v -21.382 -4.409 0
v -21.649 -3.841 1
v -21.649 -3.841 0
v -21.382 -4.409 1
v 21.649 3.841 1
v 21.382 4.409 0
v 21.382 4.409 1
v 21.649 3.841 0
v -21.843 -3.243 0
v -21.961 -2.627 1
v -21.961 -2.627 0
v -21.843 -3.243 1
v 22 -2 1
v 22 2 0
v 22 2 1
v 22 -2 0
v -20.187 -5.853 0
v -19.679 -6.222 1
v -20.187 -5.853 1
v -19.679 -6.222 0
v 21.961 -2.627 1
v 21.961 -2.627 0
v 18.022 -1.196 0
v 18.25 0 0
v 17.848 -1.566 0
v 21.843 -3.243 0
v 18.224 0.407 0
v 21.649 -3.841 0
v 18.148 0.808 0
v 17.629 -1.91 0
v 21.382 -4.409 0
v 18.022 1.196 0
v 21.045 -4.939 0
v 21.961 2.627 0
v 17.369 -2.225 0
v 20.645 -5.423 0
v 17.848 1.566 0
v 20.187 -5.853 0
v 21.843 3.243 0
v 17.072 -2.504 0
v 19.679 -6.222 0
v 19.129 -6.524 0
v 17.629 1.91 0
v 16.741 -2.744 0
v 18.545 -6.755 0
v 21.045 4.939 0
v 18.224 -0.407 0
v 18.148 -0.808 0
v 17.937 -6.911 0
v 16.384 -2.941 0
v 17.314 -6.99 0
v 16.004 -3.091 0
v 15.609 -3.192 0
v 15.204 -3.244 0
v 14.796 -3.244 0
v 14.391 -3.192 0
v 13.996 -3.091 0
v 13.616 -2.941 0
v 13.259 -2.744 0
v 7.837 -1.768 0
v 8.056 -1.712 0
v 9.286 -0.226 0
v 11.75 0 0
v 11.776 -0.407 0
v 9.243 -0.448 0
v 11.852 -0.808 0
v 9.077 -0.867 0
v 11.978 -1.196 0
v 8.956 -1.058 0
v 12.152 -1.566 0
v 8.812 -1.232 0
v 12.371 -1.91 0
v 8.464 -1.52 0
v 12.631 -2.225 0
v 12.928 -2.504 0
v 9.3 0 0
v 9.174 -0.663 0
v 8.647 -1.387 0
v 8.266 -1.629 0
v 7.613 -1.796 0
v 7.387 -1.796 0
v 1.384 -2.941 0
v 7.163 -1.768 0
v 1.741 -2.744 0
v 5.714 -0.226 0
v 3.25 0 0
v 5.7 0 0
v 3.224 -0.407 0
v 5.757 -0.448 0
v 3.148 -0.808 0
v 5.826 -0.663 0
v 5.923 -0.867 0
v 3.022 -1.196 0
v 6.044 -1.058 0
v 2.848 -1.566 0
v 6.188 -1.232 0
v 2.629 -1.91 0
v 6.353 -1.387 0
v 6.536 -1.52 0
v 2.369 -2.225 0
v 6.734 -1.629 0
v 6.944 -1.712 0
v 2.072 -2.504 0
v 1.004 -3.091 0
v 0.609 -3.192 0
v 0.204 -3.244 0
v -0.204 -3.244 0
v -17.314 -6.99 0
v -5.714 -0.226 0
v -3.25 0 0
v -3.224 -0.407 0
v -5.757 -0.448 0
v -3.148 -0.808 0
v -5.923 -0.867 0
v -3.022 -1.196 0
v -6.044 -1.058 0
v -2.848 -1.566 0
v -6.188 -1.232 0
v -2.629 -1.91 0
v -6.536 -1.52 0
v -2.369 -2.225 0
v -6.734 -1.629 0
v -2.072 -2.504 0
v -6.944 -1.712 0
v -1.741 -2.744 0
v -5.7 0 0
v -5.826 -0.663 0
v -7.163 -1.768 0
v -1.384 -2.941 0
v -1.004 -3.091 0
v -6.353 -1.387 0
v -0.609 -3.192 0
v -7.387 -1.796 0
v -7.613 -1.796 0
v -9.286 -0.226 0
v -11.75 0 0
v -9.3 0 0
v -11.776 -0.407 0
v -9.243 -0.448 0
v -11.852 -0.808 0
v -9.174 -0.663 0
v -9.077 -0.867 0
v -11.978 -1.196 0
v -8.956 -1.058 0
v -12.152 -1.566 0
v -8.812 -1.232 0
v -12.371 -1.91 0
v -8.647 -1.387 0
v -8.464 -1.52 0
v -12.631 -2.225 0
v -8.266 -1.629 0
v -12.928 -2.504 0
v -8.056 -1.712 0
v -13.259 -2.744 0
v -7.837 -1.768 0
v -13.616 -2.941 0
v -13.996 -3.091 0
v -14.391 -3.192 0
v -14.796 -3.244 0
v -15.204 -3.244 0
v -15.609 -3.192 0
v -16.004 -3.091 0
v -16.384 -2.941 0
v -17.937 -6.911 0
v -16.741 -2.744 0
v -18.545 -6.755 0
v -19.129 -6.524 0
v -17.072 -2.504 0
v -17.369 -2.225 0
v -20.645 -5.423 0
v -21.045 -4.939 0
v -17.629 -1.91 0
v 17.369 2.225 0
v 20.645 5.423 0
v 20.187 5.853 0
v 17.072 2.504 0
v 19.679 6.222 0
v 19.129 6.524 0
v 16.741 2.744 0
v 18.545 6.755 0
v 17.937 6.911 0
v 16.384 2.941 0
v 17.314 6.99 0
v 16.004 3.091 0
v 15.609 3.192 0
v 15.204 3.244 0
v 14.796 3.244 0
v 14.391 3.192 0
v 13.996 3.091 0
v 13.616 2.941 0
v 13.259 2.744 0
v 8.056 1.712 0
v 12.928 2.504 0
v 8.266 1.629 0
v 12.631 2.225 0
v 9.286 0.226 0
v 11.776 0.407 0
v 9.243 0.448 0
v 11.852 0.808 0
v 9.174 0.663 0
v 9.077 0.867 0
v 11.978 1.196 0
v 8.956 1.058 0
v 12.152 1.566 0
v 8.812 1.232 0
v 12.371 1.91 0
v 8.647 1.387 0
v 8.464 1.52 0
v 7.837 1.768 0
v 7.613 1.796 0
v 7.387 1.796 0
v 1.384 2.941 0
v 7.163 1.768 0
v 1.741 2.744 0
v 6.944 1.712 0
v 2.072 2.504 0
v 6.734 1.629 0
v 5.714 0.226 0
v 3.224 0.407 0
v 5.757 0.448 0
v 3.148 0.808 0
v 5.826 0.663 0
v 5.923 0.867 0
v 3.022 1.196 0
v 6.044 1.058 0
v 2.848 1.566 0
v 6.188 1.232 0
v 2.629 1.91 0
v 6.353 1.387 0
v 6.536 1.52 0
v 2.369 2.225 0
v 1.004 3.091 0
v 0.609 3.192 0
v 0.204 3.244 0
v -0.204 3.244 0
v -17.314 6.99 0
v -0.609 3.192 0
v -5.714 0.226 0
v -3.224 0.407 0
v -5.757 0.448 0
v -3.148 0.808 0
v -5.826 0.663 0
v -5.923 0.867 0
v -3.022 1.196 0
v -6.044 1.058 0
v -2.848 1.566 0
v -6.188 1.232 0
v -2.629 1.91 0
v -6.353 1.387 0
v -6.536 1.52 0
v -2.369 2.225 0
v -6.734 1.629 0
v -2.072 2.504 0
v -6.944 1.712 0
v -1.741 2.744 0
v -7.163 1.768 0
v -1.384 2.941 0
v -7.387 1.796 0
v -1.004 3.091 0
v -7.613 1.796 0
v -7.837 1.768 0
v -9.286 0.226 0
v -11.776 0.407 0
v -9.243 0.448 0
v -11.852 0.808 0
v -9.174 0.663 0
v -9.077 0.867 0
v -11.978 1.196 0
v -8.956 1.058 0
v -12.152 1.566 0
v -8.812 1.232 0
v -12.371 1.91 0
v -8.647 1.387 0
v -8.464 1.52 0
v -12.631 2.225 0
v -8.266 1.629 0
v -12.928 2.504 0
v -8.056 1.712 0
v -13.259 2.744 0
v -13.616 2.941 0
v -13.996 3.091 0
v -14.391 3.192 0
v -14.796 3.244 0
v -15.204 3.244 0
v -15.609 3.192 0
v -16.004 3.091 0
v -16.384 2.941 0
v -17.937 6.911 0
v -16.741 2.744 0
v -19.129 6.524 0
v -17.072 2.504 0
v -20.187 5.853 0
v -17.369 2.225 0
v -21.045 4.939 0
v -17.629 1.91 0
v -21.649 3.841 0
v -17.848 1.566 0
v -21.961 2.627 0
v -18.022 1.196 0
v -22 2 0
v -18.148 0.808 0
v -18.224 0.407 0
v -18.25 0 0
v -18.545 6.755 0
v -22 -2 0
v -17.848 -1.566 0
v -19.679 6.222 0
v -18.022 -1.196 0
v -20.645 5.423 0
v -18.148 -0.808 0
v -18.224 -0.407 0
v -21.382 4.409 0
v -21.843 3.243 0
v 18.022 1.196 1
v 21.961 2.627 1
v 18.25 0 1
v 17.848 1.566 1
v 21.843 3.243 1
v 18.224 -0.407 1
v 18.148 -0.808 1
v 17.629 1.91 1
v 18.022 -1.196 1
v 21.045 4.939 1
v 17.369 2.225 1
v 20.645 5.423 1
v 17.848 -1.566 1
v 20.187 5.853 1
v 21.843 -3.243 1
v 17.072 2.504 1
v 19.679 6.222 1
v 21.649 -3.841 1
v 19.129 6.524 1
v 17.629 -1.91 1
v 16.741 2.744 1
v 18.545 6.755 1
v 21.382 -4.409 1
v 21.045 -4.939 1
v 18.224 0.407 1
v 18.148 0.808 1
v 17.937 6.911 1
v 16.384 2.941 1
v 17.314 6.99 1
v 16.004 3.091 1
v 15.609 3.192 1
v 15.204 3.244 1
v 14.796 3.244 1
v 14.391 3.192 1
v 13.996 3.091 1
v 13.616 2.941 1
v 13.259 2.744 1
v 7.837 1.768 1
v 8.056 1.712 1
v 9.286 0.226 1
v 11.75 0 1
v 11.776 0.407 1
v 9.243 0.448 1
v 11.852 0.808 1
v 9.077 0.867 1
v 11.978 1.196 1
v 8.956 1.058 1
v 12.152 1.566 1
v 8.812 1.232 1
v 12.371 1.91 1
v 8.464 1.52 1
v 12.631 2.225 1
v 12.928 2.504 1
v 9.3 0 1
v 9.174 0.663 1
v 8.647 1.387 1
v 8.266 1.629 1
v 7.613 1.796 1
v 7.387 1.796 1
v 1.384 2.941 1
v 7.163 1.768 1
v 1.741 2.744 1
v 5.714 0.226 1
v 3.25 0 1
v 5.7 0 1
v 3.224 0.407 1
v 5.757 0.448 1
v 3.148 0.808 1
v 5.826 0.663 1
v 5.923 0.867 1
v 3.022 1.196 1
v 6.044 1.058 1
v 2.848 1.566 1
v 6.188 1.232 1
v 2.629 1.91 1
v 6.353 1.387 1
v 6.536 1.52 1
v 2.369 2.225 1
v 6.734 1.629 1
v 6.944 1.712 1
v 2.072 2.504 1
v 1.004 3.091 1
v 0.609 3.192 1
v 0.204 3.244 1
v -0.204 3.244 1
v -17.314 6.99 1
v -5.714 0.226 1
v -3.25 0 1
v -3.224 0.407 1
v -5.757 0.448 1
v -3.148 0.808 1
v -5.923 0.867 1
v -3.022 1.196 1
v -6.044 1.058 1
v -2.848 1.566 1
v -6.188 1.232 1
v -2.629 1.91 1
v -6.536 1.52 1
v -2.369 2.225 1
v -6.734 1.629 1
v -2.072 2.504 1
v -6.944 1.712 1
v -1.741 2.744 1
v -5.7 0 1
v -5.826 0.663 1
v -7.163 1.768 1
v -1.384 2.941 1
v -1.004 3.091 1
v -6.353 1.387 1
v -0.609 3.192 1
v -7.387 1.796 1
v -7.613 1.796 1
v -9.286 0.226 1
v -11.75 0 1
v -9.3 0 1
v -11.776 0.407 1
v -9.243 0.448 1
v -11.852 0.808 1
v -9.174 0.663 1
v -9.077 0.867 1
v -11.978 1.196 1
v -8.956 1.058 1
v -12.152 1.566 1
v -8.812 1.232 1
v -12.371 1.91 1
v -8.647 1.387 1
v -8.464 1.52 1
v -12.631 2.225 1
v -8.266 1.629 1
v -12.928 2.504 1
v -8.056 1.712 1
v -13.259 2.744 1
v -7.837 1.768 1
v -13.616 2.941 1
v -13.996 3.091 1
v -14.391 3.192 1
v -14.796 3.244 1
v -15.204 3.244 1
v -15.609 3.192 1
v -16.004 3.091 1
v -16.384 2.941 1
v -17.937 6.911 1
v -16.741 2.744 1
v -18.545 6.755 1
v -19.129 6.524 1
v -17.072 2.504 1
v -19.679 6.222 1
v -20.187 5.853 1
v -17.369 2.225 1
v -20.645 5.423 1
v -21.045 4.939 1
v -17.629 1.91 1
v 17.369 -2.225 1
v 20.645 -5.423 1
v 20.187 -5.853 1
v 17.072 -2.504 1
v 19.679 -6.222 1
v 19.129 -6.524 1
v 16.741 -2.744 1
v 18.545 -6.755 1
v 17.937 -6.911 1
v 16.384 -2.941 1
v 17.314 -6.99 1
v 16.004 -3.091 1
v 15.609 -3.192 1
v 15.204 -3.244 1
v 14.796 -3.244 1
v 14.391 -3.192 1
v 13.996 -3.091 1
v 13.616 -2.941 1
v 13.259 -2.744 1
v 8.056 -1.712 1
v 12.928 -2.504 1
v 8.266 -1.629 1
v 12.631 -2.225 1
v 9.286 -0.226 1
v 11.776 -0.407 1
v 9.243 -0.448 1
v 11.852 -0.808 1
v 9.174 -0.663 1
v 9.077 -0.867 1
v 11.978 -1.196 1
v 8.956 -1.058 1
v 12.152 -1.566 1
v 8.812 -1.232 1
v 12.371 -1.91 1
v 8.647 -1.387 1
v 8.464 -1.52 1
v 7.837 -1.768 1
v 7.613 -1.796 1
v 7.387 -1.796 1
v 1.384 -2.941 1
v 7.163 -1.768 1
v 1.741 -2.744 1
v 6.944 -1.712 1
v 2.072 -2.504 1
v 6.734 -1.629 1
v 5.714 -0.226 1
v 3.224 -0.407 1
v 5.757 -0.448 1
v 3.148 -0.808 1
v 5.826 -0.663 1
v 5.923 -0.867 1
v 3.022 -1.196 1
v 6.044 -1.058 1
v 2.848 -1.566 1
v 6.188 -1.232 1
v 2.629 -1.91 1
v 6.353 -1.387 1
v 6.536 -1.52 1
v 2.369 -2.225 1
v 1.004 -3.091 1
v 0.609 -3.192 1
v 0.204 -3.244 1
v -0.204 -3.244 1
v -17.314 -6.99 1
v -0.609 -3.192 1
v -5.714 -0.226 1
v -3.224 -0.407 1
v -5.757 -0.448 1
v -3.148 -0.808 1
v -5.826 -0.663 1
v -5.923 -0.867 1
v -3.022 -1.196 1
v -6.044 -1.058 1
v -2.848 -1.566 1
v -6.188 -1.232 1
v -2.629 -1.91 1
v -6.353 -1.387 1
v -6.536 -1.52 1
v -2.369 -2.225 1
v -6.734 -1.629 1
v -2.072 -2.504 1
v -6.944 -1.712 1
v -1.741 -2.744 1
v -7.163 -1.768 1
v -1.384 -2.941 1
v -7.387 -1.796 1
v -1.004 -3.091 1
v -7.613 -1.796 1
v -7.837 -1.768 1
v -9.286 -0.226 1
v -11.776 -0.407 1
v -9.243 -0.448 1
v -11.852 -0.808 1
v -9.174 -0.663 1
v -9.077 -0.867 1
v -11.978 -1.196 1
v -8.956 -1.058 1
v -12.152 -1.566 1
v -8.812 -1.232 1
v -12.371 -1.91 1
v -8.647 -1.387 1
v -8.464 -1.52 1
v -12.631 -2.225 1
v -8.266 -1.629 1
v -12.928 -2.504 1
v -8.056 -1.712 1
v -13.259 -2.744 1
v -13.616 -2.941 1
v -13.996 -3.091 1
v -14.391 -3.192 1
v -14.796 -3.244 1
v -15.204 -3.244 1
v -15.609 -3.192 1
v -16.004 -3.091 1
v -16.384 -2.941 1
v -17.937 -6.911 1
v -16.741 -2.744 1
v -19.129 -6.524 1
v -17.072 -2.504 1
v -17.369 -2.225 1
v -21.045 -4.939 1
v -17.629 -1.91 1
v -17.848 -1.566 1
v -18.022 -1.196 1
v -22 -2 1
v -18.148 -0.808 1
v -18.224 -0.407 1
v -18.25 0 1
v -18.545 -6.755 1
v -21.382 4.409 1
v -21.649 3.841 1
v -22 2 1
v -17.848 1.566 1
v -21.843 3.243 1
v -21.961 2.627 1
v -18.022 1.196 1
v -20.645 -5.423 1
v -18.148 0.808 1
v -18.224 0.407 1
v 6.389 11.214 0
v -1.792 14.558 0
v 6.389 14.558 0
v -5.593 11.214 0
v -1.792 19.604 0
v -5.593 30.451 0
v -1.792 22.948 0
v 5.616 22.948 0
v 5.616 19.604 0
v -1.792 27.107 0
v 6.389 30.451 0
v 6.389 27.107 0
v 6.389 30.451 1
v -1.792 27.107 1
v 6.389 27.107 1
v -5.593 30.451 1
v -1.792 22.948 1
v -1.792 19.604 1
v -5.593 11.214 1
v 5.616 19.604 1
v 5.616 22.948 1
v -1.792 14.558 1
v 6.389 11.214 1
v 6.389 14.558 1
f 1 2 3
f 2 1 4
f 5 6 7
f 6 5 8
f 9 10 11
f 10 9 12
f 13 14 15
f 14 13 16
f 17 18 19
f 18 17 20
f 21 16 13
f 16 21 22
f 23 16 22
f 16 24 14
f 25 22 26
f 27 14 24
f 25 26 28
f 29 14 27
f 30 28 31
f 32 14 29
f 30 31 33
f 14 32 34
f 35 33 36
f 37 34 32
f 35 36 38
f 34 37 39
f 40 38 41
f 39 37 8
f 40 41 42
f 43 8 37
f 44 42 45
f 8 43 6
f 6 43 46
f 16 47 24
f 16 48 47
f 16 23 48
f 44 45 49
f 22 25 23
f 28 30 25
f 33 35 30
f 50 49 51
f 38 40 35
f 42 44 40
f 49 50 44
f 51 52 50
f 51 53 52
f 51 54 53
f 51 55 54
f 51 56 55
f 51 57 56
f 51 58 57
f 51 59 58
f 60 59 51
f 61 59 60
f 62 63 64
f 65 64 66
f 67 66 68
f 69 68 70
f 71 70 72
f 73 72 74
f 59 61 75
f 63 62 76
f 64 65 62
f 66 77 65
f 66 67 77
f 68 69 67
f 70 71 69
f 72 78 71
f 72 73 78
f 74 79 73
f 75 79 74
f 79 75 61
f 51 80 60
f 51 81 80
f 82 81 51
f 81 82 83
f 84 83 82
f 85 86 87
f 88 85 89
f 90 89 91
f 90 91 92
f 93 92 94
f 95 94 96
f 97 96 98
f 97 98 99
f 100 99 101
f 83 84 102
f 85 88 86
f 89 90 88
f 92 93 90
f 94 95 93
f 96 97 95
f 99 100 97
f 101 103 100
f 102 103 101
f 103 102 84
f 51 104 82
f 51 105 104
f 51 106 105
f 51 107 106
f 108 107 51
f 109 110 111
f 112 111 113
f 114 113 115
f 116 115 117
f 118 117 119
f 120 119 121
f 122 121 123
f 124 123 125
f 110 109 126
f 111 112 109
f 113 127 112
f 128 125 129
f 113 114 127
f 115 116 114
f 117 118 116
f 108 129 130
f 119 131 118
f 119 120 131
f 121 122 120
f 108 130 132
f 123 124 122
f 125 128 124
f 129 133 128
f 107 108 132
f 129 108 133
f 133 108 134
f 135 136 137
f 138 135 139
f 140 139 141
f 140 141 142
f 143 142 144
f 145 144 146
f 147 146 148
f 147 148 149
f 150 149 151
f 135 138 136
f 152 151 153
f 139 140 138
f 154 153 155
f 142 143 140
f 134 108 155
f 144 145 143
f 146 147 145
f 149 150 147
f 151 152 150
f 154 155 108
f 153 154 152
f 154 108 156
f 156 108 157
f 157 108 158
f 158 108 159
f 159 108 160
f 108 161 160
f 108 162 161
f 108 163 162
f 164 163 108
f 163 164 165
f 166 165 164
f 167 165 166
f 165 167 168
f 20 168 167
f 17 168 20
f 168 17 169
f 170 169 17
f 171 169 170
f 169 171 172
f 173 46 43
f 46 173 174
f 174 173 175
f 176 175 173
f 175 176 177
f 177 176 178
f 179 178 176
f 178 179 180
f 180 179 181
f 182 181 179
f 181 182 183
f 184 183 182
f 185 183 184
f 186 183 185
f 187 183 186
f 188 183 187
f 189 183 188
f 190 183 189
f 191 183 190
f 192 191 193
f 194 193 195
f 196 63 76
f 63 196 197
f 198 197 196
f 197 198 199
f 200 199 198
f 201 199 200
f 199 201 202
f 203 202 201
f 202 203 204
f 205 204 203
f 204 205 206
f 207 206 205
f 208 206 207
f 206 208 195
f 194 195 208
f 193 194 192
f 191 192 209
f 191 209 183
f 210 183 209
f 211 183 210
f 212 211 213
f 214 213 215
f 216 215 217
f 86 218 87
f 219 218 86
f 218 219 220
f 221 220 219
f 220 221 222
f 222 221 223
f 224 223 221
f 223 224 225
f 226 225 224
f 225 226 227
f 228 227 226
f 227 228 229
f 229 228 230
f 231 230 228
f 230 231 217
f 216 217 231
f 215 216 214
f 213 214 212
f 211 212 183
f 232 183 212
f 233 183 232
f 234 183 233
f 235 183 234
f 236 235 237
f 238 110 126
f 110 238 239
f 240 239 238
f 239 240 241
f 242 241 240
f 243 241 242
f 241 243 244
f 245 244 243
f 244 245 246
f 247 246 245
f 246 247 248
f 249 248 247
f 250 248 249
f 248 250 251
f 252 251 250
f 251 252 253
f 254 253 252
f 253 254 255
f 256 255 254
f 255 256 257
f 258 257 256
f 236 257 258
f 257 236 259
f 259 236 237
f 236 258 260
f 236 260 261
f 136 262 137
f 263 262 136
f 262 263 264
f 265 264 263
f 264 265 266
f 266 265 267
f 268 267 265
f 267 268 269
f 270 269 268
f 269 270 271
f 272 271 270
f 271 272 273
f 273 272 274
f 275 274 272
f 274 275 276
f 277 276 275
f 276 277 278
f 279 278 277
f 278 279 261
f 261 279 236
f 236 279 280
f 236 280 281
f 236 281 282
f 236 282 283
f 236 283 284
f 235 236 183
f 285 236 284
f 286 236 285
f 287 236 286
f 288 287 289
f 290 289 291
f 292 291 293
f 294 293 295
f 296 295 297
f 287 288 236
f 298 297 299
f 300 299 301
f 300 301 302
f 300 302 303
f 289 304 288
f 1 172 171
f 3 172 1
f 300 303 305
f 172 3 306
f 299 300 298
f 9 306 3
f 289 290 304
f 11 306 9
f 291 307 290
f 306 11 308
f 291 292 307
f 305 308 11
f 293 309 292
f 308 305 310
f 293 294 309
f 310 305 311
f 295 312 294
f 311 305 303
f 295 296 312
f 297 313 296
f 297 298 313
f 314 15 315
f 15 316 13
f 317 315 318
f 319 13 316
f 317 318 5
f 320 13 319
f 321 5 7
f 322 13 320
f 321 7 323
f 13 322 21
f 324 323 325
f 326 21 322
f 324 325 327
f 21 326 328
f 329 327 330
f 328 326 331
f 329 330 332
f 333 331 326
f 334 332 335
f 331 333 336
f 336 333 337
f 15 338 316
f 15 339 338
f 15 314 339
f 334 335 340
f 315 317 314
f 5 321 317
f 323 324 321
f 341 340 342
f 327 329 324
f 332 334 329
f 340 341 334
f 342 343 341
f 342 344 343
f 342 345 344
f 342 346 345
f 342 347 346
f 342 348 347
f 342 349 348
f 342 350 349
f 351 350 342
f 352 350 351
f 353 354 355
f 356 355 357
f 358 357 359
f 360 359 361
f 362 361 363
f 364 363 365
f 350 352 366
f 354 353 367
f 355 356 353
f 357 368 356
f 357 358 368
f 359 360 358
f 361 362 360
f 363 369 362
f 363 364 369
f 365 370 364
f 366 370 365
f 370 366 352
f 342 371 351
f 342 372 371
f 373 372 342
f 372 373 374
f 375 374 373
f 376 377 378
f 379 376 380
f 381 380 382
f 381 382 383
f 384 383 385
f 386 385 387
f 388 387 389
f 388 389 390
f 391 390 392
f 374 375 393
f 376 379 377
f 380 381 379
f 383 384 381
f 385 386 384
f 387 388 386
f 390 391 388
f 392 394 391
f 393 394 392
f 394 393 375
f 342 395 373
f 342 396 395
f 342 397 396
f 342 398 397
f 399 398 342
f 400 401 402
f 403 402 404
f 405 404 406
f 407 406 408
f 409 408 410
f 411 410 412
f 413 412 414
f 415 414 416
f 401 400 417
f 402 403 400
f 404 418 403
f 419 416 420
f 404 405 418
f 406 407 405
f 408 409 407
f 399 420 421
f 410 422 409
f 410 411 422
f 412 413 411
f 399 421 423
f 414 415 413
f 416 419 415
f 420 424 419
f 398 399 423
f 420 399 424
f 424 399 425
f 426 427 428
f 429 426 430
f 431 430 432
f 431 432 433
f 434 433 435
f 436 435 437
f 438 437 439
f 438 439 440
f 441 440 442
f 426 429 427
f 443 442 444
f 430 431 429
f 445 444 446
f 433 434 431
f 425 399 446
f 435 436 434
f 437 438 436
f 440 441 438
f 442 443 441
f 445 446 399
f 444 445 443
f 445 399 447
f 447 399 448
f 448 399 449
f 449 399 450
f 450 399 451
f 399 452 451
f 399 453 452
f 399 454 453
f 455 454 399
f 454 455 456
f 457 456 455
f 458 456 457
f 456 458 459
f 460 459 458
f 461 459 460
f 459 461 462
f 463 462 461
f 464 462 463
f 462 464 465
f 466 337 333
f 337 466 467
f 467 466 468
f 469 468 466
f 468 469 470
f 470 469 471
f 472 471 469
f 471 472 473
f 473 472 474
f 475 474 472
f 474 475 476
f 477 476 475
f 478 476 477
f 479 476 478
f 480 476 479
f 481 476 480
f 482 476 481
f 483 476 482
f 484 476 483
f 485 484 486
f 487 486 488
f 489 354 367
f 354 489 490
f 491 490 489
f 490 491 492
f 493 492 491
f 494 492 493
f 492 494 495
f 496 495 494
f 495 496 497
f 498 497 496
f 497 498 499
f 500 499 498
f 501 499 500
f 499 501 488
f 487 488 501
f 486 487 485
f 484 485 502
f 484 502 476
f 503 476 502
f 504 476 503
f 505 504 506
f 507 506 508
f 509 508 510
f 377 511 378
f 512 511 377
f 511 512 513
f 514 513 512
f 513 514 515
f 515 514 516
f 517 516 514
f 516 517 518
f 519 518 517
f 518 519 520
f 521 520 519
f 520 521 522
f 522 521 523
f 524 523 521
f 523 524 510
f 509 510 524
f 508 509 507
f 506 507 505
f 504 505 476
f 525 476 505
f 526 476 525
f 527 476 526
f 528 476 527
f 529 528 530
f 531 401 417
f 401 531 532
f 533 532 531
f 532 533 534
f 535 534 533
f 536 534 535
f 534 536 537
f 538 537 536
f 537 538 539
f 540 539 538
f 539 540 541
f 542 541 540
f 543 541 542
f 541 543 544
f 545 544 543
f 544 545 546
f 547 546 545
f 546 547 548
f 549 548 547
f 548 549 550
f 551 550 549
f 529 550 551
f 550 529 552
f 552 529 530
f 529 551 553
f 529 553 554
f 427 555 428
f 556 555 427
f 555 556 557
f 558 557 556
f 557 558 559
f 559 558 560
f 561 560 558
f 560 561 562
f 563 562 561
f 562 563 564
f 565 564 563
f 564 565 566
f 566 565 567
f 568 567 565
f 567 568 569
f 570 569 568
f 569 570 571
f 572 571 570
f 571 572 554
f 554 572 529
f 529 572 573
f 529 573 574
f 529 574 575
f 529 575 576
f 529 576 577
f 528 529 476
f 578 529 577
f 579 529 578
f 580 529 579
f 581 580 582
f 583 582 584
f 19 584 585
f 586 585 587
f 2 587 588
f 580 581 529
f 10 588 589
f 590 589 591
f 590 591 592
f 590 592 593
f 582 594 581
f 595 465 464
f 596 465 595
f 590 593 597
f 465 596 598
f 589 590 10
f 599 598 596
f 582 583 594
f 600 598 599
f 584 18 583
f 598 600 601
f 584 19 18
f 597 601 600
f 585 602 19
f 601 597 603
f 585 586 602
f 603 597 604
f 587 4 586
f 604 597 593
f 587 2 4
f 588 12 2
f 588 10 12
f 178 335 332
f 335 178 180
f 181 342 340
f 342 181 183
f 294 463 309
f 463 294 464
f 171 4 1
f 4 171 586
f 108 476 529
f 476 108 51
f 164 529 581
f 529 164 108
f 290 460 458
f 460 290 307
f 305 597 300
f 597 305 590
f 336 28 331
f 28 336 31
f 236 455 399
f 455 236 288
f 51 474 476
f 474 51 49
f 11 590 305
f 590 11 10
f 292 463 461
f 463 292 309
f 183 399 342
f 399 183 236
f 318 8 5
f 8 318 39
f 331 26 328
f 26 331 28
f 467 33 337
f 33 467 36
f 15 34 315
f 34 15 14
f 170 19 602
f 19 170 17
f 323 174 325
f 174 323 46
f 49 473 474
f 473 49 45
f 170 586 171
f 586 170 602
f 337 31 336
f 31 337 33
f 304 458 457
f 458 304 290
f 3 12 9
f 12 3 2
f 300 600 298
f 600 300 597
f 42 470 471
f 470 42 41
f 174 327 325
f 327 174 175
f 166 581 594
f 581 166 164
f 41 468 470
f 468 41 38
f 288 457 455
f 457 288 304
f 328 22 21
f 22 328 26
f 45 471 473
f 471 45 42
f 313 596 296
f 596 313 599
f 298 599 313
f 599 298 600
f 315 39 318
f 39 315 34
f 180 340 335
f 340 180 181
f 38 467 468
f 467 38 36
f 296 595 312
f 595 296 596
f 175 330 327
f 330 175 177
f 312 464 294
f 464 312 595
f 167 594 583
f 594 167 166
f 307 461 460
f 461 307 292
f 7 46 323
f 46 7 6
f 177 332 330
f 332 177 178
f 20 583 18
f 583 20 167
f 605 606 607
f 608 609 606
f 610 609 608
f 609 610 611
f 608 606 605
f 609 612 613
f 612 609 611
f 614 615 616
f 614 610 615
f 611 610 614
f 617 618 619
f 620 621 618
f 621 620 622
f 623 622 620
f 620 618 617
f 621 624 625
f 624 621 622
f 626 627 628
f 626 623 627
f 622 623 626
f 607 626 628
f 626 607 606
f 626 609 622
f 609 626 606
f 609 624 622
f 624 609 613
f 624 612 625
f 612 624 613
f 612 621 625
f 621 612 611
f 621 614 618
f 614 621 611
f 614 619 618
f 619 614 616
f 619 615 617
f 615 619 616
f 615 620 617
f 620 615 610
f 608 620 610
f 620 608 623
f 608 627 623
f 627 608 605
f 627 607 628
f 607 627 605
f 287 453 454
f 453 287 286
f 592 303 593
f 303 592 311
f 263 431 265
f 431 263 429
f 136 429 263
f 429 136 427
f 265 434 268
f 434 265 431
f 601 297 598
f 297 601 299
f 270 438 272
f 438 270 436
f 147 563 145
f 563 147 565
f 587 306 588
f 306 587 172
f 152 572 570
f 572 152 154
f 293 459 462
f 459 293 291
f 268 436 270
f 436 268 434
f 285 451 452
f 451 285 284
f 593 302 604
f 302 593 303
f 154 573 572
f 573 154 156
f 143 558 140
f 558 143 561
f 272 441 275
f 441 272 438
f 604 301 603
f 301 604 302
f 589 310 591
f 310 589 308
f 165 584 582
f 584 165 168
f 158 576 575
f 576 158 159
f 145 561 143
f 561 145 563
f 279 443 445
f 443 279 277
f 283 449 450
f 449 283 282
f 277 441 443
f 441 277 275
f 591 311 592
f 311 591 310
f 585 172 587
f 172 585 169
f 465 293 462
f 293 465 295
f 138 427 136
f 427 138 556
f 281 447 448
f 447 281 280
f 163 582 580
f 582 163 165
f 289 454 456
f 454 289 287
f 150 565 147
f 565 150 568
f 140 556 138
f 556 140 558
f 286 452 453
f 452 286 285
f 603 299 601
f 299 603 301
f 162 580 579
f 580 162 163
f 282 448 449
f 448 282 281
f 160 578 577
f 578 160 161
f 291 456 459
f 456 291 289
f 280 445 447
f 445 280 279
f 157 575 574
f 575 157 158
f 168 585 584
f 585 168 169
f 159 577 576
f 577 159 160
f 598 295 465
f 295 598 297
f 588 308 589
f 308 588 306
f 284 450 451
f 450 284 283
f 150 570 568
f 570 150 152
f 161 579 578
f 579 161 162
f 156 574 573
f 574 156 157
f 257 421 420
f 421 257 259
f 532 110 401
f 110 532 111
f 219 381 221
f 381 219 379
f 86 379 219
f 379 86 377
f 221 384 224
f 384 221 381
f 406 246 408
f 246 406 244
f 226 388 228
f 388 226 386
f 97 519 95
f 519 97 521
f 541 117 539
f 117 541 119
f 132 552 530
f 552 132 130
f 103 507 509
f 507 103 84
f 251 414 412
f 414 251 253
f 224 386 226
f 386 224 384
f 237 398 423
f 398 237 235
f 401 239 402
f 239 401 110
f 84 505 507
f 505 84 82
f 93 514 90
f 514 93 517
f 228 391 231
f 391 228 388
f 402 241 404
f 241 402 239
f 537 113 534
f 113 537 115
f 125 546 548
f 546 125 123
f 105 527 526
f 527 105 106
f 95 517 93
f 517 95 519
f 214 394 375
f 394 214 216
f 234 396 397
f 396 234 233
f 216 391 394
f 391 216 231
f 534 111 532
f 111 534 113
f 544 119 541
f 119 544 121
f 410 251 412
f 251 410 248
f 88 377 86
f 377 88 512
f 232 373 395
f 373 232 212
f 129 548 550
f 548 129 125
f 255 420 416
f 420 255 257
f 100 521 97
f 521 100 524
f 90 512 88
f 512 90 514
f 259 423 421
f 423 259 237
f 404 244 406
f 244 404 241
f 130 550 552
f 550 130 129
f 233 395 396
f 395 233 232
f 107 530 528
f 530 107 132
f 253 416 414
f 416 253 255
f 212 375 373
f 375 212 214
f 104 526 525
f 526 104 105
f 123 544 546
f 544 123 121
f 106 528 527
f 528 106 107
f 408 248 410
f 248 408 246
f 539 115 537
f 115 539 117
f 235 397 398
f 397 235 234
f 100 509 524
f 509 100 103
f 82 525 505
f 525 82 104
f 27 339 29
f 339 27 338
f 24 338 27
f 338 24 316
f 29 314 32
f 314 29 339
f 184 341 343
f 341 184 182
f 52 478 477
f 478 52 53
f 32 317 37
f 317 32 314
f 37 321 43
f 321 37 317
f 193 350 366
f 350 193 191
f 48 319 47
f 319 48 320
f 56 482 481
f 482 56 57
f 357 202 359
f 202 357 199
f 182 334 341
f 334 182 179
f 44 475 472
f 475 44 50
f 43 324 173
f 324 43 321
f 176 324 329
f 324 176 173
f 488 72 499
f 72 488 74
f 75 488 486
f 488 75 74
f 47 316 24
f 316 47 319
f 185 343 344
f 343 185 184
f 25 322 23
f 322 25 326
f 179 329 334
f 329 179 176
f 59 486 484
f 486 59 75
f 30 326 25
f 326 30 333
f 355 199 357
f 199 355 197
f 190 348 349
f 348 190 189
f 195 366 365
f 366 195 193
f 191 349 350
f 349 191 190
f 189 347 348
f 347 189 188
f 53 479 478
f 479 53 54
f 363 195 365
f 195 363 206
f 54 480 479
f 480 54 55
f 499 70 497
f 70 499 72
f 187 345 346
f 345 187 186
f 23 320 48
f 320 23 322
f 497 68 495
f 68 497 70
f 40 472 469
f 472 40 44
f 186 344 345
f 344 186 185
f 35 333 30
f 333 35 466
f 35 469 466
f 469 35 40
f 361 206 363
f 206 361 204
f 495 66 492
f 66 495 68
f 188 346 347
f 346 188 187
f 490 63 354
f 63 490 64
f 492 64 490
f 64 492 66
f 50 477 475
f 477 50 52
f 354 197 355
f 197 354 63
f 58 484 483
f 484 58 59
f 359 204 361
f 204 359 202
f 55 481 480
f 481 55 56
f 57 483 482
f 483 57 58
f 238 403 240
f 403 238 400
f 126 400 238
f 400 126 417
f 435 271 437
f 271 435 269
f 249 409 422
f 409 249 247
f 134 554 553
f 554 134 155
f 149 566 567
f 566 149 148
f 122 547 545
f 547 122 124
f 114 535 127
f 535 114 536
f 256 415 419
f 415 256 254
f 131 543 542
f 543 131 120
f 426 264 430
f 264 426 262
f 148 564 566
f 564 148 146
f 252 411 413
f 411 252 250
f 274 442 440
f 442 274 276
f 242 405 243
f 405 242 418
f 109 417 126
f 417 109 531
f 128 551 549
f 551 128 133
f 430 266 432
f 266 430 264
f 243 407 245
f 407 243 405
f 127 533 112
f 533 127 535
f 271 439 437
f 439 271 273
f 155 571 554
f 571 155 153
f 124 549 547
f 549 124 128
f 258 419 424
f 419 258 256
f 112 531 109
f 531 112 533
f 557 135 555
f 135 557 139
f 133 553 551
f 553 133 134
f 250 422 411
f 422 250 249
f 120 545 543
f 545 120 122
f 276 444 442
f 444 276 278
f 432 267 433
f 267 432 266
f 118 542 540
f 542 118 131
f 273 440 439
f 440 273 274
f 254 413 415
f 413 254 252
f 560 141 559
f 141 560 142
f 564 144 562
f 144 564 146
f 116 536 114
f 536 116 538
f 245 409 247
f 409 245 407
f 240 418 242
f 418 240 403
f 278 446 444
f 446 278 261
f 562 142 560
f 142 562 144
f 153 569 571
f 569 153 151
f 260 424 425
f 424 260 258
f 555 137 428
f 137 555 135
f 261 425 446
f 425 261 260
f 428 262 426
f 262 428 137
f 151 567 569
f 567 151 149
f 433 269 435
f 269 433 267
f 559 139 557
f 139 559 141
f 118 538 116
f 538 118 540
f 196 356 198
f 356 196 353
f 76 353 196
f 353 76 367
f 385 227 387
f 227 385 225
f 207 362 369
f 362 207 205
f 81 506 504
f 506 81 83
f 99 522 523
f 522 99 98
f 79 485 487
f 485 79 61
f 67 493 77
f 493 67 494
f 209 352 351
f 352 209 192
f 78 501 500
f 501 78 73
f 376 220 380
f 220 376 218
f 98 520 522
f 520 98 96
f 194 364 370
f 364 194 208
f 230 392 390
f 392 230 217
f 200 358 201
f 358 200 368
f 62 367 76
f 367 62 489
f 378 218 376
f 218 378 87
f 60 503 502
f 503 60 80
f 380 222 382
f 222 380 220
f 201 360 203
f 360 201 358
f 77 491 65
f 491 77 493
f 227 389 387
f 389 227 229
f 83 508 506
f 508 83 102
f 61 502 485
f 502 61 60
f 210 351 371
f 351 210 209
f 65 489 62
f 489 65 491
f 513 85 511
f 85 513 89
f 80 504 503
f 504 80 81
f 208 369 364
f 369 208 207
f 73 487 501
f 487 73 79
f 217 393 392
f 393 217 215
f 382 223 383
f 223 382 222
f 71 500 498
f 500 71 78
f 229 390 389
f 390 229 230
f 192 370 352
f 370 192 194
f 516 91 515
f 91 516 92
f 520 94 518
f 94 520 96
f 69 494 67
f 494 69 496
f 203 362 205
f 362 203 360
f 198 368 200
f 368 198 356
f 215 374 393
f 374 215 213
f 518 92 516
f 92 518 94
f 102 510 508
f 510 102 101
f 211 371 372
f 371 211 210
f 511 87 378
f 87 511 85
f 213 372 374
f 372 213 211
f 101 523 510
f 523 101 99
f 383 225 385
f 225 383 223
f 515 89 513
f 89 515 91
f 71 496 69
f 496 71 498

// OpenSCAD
$fn = 50;


difference() {
	union() {
		hull() {
			translate(v = [-17.0000000000, 2.0000000000, 0]) {
				cylinder(h = 1, r = 5);
			}
			translate(v = [17.0000000000, 2.0000000000, 0]) {
				cylinder(h = 1, r = 5);
			}
			translate(v = [-17.0000000000, -2.0000000000, 0]) {
				cylinder(h = 1, r = 5);
			}
			translate(v = [17.0000000000, -2.0000000000, 0]) {
				cylinder(h = 1, r = 5);
			}
		}
		translate(v = [0, 30.0000000000, 0]) {
			linear_extrude(height = 1) {
				text(font = "DejaVu Sans Mono:style=Bold", halign = "center", size = 19.0000000000, text = "E", valign = "top");
			}
		}
	}
	union() {
		translate(v = [-15.0000000000, 0.0000000000, 0]) {
			translate(v = [0, 0, -100]) {
				cylinder(h = 200, r = 3.2500000000);
			}
		}
		translate(v = [0, 0, -100]) {
			cylinder(h = 200, r = 3.2500000000);
		}
		translate(v = [15.0000000000, 0.0000000000, 0]) {
			translate(v = [0, 0, -100]) {
				cylinder(h = 200, r = 3.2500000000);
			}
		}
		translate(v = [-15.0000000000, 0.0000000000, 0]) {
			translate(v = [0, 0, -100]) {
				cylinder(h = 200, r = 1.8000000000);
			}
		}
		translate(v = [-7.5000000000, 0.0000000000, 0]) {
			translate(v = [0, 0, -100]) {
				cylinder(h = 200, r = 1.8000000000);
			}
		}
		translate(v = [0, 0, -100]) {
			cylinder(h = 200, r = 1.8000000000);
		}
		translate(v = [7.5000000000, 0.0000000000, 0]) {
			translate(v = [0, 0, -100]) {
				cylinder(h = 200, r = 1.8000000000);
			}
		}
		translate(v = [15.0000000000, 0.0000000000, 0]) {
			translate(v = [0, 0, -100]) {
				cylinder(h = 200, r = 1.8000000000);
			}
		}
	}
}
